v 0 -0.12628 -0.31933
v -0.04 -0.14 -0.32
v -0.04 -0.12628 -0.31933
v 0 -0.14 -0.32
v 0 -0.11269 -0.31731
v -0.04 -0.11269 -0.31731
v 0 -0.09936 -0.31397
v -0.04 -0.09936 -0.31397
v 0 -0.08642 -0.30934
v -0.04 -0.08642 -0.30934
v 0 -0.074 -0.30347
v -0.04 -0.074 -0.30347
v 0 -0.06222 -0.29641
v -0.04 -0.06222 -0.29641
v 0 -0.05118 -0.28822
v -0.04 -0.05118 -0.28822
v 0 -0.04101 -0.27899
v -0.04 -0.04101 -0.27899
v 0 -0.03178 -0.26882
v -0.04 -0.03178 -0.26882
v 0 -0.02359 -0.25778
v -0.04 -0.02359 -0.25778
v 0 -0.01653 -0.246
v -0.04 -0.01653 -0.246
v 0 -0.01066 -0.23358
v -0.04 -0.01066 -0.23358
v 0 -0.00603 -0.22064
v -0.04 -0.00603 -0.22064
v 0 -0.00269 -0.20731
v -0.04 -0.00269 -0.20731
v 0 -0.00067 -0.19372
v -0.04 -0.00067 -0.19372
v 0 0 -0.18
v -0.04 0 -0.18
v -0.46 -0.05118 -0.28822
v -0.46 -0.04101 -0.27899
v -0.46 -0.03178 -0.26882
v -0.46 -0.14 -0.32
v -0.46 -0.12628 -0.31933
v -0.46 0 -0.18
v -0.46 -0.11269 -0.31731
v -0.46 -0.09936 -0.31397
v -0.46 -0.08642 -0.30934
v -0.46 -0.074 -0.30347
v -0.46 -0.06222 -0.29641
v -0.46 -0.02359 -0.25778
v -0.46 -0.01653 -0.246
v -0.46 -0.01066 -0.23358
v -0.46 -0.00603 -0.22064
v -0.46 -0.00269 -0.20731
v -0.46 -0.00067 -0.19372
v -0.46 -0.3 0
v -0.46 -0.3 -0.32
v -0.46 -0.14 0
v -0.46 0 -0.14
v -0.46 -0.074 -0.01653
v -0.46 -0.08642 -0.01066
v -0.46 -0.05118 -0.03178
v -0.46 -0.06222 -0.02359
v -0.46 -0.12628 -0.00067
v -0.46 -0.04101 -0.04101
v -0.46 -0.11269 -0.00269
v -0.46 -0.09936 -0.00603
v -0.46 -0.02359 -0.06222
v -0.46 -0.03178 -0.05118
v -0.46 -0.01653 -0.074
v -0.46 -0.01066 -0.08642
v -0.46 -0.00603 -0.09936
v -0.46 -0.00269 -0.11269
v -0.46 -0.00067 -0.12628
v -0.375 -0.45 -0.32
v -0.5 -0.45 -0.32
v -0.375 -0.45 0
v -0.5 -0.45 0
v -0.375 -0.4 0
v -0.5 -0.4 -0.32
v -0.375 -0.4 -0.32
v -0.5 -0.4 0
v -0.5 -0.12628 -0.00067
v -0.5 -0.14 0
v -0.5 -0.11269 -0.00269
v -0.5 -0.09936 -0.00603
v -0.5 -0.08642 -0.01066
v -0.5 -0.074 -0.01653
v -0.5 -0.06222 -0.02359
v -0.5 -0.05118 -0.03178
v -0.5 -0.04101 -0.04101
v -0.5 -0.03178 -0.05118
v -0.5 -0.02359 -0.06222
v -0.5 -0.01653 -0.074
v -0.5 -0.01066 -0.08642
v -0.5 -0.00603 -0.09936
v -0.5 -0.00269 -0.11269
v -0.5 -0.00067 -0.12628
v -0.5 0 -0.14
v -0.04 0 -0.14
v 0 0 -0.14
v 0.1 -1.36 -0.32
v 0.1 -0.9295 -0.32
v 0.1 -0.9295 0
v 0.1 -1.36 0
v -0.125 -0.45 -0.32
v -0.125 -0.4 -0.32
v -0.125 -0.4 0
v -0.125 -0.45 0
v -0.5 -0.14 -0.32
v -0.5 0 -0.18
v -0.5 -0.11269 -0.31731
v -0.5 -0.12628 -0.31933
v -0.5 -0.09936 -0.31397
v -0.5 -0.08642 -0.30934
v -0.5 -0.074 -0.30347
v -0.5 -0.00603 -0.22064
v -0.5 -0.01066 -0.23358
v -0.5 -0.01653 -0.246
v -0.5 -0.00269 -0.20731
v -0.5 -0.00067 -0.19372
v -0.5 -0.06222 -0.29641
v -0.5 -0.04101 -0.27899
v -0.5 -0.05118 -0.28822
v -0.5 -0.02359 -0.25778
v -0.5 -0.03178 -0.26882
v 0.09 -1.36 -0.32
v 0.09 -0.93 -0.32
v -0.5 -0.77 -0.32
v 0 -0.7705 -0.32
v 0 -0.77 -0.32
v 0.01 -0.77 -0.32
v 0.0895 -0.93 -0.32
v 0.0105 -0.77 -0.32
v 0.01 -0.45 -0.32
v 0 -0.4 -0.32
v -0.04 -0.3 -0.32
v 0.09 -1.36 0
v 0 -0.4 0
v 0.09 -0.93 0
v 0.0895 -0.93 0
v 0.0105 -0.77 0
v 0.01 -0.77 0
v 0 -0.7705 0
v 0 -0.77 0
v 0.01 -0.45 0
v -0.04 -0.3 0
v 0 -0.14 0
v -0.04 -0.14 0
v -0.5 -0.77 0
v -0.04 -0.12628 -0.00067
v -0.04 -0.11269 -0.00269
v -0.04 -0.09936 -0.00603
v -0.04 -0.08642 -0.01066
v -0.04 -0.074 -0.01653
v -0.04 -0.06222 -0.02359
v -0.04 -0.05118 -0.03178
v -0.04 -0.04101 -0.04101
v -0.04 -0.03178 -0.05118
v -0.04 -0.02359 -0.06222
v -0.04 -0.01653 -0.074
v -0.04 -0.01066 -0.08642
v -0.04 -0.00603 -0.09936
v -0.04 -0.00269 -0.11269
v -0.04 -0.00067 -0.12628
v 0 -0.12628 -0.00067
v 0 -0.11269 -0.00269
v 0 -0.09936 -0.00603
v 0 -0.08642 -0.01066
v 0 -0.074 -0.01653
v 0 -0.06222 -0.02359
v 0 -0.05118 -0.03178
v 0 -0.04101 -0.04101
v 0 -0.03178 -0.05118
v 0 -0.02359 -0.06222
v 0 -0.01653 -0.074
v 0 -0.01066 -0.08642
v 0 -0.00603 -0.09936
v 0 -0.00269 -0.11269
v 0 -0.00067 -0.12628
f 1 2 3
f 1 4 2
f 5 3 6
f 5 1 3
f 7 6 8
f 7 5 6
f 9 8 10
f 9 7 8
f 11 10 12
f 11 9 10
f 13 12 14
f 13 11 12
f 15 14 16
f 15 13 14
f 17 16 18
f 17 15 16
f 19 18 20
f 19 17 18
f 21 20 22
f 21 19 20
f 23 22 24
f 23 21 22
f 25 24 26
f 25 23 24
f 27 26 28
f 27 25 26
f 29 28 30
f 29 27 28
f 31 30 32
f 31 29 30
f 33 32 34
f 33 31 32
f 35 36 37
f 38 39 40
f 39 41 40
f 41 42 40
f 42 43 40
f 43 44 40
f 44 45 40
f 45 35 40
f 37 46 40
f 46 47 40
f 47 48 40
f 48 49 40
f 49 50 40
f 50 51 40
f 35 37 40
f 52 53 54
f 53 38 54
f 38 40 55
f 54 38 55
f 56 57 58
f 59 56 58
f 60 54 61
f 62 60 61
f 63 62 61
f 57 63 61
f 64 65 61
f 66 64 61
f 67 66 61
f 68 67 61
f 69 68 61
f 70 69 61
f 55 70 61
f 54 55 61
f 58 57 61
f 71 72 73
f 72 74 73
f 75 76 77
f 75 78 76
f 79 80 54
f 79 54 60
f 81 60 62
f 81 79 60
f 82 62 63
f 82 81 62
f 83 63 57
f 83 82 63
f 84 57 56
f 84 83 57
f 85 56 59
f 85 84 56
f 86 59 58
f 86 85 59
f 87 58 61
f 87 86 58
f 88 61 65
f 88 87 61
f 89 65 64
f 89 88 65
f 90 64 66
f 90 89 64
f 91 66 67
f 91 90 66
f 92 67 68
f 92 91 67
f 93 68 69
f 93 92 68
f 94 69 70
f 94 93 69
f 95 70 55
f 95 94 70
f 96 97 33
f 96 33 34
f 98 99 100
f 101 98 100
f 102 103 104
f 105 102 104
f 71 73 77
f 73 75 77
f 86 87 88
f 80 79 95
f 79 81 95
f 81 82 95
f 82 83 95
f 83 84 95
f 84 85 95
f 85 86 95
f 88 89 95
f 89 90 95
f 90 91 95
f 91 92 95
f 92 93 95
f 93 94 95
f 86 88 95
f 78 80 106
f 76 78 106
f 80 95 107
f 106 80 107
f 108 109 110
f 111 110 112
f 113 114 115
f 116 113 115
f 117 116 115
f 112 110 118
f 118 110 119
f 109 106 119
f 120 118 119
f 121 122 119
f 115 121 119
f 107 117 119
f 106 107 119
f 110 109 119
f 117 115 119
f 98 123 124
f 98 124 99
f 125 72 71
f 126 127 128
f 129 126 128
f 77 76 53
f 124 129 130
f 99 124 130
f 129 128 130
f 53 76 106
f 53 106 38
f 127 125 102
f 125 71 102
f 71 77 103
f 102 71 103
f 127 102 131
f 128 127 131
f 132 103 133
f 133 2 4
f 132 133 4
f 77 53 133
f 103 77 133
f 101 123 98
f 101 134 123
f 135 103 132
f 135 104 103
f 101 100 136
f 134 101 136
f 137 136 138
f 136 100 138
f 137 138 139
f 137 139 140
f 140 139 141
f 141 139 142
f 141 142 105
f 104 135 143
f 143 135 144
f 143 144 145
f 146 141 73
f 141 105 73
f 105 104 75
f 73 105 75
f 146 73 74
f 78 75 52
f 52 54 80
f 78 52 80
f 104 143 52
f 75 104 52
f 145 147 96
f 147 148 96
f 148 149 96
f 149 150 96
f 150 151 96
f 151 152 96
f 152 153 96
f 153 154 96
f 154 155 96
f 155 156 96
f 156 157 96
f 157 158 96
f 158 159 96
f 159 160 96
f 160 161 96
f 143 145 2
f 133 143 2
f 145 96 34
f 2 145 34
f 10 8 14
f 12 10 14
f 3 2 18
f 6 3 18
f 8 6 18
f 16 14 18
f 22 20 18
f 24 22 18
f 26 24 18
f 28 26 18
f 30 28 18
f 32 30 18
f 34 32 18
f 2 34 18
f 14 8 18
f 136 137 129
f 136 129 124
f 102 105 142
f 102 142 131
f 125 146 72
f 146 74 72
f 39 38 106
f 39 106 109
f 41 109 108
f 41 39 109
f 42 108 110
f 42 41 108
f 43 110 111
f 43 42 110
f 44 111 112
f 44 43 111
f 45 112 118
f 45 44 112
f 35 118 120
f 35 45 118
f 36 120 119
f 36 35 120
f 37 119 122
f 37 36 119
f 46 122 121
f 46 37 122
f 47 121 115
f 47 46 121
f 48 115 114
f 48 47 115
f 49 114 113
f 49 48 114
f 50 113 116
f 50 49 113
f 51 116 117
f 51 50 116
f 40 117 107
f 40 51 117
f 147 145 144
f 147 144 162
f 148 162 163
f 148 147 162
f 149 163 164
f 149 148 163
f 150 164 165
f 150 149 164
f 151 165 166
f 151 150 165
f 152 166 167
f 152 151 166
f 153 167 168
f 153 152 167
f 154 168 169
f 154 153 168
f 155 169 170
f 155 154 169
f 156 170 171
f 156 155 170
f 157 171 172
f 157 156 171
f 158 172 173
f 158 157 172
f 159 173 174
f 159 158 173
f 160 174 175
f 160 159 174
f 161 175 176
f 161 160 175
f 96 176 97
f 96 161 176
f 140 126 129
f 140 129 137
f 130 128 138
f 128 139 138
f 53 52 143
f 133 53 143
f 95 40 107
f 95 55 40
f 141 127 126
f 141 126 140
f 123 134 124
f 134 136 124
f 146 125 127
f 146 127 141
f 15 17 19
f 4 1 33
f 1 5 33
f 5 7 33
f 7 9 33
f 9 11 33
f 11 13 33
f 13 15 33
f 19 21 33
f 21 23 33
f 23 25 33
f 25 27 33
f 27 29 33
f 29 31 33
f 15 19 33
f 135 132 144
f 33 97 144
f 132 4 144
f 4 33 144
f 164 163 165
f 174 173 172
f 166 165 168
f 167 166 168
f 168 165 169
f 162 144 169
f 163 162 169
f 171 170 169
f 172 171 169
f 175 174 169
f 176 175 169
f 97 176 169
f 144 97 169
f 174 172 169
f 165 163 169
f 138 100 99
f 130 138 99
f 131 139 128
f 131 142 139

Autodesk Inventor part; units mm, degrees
ref_plane "YZ Plane" through (0, 0, 0) normal (1, 0, 0) x (0, 1, 0)
ref_plane "XZ Plane" through (0, 0, 0) normal (0, 1, 0) x (-1, 0, 0)
ref_plane "XY Plane" through (0, 0, 0) normal (0, 0, 1) x (1, 0, 0)
sketch "スケッチ1" plane through (0, 0, 0) normal (0, 1, 0) x (-1, 0, 0)
  line L0 (0, 0) -> (0.04, 0)
  line L1 (0.04, 0) -> (0.04, -0.32)
  line L2 (0.04, -0.32) -> (0, -0.32)
  line L3 (0, -0.32) -> (0, 0)
  line L4 (0.46, 0) -> (0.5, 0)
  line L5 (0.5, 0) -> (0.5, -0.32)
  line L6 (0.5, -0.32) -> (0.46, -0.32)
  line L7 (0.46, -0.32) -> (0.46, 0)
  dimension "d0" = 0.04
  dimension "d1" = 0.32
  dimension "d2" = 0.04
extrude "押し出し1" add sketch "スケッチ1" against normal blind 0.3
sketch "スケッチ2" plane through (0, -0.3, 0) normal (0, -1, 0) x (1, 0, 0)
  line L0 (0, -0.32) -> (0, 0) projected
  line L1 (-0.5, 0) -> (-0.5, -0.32) projected
  line L2 (0, 0) -> (-0.5, 0)
  line L3 (-0.5, 0) -> (-0.5, -0.32)
  line L4 (-0.5, -0.32) -> (0, -0.32)
  line L5 (0, -0.32) -> (0, 0)
extrude "押し出し2" add sketch "スケッチ2" along normal blind 0.1
sketch "スケッチ3" plane through (0, -0.4, 0) normal (0, -1, 0) x (1, 0, 0)
  line L0 (-0.04, 0) -> (-0.46, 0) projected
  line L1 (-0.46, -0.32) -> (-0.04, -0.32) projected
  line L2 (-0.125, 0) -> (-0.375, 0)
  line L3 (-0.375, 0) -> (-0.375, -0.32)
  line L4 (-0.375, -0.32) -> (-0.125, -0.32)
  line L5 (-0.125, -0.32) -> (-0.125, 0)
  point P0 (0, 0)
  dimension "d7" = 0.25
extrude "押し出し3" add sketch "スケッチ3" along normal blind 0.05
sketch "スケッチ4" plane through (0, -0.45, 0) normal (0, -1, 0) x (1, 0, 0)
  line L0 (-0.5, 0) -> (-0.5, -0.32) projected
  line L1 (0, 0) -> (-0.5, 0)
  line L2 (-0.5, 0) -> (-0.5, -0.32)
  line L3 (-0.5, -0.32) -> (0, -0.32)
  line L4 (0, -0.32) -> (0, 0)
extrude "押し出し4" add sketch "スケッチ4" along normal blind 0.32
sketch "スケッチ5" plane through (0, -0.45, 0) normal (1, 0, 0) x (0, 0, -1)
  line L0 (0.32, 0) -> (0.32, -0.32) projected
  line L1 (0, 0) -> (0.32, 0)
  line L2 (0.32, 0) -> (0.32, -0.32)
  line L3 (0.32, -0.32) -> (0, -0.32)
  line L4 (0, -0.32) -> (0, 0)
  point P0 (0, 0.45)
extrude "押し出し5" add sketch "スケッチ5" along normal blind 0.01
sketch "スケッチ6" plane through (0, -0.77, 0) normal (0, -1, 0) x (1, 0, 0)
  line L0 (0, -0.32) -> (0, 0) projected
  line L1 (0, 0) -> (0.1, 0)
  line L2 (0.1, 0) -> (0.1, -0.32)
  line L3 (0.1, -0.32) -> (0, -0.32)
  line L4 (0, -0.32) -> (0, 0)
  dimension "d14" = 0.1
extrude "押し出し6" add sketch "スケッチ6" along normal blind 0.16
chamfer "面取り1" distance 0.09 distance2 0.16 1 edges at (0, -0.93, -0.16) measured on face at (0.0333, -0.93, -0.1067)
chamfer "面取り2" distance 0.09 distance2 0.16 1 edges at (0.1, -0.77, -0.16) measured on face at (0.04, -0.77, -0.1067)
sketch "スケッチ7" plane through (0, -0.93, 0) normal (0, -1, 0) x (1, 0, 0)
  line L0 (0.1, -0.32) -> (0.1, 0) projected
  line L1 (0, -0.32) -> (0.09, -0.32) projected
  line L2 (0.1, 0) -> (0.09, 0)
  line L3 (0.09, 0) -> (0.09, -0.32)
  line L4 (0.09, -0.32) -> (0.1, -0.32)
  line L5 (0.1, -0.32) -> (0.1, 0)
  point P0 (0, 0)
extrude "押し出し7" add sketch "スケッチ7" along normal blind 0.43
fillet "フィレット1" radius 0.14 4 edges at (-0.02, 0, 0) (-0.02, 0, -0.32) (-0.48, 0, 0) (-0.48, 0, -0.32)
sketch "スケッチ8" plane through (-0.46, -0.3, 0) normal (0, 0, 1) x (1, 0, 0)
  point P0 (0.46, 0.3)
properties part number "CRANEJ4"
